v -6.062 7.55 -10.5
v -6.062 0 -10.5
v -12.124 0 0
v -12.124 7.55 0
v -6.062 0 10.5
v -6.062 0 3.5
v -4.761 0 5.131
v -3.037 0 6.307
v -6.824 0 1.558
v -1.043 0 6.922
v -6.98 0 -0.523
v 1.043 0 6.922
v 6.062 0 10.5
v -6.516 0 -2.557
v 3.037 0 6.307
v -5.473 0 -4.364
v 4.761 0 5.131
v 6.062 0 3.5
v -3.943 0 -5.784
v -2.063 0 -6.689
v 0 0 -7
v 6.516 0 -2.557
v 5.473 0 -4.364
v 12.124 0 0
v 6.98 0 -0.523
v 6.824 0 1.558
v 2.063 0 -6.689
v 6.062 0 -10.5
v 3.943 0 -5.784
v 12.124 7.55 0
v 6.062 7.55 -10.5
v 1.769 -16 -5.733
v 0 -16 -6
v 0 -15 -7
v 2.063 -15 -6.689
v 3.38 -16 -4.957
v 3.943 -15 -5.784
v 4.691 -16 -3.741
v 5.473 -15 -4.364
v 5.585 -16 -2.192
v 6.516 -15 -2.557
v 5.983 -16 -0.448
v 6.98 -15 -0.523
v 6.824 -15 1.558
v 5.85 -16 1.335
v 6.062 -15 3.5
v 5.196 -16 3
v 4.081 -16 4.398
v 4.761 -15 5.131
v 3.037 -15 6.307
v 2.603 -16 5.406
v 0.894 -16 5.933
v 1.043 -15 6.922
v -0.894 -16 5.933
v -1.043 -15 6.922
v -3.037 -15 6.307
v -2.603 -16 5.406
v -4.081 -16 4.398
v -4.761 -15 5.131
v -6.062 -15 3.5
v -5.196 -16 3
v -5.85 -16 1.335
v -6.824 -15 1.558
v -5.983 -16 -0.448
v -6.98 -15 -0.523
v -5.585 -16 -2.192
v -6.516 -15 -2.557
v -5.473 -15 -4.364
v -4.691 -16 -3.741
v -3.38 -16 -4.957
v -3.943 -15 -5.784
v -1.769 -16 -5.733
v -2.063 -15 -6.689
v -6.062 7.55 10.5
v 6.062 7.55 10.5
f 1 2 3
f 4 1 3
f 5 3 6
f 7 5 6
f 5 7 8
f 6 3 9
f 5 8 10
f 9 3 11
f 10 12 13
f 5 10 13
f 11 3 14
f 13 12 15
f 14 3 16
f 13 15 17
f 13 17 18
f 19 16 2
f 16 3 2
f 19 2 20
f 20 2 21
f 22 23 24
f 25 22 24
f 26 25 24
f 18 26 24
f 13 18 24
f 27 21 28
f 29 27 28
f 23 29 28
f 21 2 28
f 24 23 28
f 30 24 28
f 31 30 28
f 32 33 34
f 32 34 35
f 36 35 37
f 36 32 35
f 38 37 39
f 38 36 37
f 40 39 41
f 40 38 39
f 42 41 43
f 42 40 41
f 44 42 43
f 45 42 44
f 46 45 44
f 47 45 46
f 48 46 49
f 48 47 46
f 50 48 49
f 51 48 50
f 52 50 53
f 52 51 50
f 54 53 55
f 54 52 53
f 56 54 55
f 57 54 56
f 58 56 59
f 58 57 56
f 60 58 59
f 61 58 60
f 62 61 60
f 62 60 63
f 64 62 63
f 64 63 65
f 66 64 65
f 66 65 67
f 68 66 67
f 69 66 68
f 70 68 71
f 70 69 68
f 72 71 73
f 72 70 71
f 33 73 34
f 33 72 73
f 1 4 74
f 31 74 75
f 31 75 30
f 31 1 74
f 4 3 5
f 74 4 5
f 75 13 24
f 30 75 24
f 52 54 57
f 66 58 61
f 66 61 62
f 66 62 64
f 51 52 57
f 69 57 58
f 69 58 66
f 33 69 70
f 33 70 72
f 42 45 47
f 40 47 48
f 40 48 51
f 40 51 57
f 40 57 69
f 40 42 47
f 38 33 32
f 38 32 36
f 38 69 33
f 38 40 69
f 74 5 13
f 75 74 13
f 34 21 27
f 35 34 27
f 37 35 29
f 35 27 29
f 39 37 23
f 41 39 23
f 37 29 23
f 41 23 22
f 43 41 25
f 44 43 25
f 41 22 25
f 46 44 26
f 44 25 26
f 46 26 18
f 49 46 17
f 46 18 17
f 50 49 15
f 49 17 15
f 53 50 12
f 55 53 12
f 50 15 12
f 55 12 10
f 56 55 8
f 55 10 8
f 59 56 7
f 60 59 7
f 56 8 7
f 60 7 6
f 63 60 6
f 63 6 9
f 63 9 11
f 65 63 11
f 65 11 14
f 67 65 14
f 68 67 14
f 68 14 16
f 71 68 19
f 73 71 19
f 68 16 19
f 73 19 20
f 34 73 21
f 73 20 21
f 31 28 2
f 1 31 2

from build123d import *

# Parameters (mm, degrees)
BOSS_EXTRUDE1_DEPTH = 7.55
SKETCH2_R           = 7
BOSS_EXTRUDE2_DEPTH = 16
CHAMFER1_SIZE       = 1


with BuildPart() as part:
    # Sketch1 → Boss-Extrude1 (new body)
    with BuildSketch(Plane(origin=(0, 0, 0), x_dir=(1, 0, 0), z_dir=(0, 1, 0))):
        Polygon((-12.124355653, 0), (-6.062177826, -10.5), (6.062177826, -10.5), (12.124355653, 0), (6.062177826, 10.5), (-6.062177826, 10.5), align=None)
    extrude(amount=BOSS_EXTRUDE1_DEPTH)

    # Sketch2 → Boss-Extrude2 (add)
    with BuildSketch(Plane.XZ):
        with Locations(Location((0, 0, 0), (0, 0, 270))):
            Circle(SKETCH2_R)
    extrude(amount=BOSS_EXTRUDE2_DEPTH)

    # Chamfer1
    chamfer1_edges = [part.edges().sort_by_distance(p)[0] for p in [
        (0, -16, 7),
    ]]
    chamfer(chamfer1_edges, length=CHAMFER1_SIZE)


solid = part.part
